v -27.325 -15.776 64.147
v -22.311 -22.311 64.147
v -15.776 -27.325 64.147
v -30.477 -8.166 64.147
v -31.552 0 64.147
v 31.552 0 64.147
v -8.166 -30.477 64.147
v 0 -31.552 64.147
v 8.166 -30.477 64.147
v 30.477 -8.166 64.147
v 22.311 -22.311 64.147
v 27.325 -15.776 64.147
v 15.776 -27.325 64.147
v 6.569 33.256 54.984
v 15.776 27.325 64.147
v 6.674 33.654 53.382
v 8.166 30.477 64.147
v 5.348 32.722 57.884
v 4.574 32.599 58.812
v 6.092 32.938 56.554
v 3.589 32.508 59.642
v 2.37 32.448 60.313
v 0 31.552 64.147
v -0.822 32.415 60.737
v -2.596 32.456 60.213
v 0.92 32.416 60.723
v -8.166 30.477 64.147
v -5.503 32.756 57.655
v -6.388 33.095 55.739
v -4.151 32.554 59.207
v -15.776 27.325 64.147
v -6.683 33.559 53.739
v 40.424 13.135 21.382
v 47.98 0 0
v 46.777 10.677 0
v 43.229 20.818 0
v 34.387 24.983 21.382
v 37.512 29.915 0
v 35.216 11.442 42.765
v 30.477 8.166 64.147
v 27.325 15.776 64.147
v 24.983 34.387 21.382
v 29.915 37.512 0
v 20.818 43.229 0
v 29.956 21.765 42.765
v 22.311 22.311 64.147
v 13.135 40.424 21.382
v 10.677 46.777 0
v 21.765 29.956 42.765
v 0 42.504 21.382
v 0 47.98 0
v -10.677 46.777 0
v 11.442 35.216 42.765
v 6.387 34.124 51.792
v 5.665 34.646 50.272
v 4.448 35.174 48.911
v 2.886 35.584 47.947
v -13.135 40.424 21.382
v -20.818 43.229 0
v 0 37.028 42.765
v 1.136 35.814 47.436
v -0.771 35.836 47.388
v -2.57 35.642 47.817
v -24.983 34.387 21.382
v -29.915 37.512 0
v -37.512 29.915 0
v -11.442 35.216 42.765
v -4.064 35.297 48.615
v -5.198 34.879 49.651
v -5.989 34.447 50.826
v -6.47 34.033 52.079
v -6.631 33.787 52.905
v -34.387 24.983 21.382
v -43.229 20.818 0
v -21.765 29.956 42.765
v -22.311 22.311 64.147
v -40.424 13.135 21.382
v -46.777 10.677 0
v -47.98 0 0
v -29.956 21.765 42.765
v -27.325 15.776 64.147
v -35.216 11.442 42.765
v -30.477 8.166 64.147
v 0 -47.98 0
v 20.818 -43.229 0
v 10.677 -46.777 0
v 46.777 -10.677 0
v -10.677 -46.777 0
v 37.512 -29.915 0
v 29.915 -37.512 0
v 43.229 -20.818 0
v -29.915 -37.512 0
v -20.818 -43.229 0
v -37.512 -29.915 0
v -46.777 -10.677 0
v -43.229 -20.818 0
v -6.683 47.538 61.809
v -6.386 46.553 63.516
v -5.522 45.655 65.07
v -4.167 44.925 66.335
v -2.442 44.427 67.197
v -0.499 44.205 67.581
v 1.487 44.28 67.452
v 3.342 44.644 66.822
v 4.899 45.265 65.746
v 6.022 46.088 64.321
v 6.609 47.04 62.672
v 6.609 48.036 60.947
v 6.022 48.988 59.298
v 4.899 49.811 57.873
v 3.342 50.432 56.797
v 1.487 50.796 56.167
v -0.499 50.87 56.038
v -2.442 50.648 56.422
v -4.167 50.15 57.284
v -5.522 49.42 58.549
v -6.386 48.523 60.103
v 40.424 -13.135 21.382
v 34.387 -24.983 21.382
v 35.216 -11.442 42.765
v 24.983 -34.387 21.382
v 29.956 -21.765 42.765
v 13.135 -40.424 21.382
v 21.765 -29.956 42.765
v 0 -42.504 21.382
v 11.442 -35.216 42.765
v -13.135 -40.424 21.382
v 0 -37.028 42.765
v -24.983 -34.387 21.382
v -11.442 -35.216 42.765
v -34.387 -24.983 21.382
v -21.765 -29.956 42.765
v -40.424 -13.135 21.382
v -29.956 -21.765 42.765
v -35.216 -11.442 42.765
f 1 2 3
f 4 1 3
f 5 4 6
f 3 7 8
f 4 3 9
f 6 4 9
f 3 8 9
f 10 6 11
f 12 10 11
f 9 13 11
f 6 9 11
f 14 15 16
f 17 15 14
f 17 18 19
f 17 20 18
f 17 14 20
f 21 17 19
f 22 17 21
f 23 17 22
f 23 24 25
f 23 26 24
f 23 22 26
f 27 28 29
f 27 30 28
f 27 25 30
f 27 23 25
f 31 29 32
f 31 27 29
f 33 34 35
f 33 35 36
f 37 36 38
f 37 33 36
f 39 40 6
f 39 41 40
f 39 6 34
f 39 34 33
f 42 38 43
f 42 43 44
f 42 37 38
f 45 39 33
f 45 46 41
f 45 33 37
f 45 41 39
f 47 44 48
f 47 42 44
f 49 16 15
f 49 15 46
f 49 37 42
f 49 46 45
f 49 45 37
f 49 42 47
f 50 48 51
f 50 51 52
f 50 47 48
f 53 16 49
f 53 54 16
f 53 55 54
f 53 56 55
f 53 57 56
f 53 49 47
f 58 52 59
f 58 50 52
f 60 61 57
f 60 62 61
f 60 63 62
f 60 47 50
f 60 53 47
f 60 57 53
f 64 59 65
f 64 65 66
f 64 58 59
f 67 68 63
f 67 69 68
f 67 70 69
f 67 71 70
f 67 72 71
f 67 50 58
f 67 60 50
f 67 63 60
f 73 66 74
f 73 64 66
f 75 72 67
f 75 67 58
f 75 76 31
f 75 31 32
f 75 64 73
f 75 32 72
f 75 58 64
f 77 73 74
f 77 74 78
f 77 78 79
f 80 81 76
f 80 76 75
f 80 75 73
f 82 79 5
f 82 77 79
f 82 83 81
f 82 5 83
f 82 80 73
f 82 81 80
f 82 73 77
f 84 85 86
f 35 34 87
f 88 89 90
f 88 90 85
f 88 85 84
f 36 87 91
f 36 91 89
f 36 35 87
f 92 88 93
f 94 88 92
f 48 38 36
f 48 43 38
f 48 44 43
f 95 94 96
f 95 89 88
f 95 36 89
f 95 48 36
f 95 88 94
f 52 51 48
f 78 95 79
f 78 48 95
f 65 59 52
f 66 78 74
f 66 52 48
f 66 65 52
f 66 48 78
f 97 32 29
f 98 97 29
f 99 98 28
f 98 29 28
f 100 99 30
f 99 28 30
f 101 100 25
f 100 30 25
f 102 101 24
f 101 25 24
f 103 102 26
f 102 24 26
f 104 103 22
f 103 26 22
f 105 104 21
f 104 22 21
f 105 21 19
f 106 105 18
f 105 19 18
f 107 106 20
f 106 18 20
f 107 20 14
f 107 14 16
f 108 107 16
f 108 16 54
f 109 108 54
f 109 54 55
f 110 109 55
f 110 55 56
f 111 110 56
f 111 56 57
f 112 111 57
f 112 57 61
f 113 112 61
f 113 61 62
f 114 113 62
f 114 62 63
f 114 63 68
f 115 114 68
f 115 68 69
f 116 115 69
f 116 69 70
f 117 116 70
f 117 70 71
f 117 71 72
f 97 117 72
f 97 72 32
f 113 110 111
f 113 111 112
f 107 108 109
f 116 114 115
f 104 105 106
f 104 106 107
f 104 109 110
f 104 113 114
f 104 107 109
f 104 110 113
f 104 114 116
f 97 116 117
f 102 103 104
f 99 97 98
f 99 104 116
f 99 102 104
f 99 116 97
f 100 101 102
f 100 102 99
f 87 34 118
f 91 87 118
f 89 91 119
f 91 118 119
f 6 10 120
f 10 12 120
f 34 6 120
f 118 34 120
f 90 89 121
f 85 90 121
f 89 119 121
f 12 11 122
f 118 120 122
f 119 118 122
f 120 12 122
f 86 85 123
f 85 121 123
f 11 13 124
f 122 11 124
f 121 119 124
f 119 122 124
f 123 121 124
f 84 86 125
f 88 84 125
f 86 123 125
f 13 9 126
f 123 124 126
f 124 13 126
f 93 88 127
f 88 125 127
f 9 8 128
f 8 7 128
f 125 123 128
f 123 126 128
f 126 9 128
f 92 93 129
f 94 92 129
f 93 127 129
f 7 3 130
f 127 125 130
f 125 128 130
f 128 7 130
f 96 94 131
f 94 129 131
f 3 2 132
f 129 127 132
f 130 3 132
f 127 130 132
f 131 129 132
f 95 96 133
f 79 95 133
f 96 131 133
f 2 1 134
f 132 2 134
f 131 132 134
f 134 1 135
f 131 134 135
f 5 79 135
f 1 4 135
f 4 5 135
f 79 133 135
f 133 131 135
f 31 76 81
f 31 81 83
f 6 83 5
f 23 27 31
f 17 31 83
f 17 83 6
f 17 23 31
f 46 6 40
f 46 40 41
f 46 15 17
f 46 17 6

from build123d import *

# Parameters (mm, degrees)
F1_ANGLE = 180
F4_R     = 6.68337
F5_DEPTH = 40


with BuildPart() as f1:
    # F0 (on Front) → F1 (revolve)
    with BuildSketch(Plane.XZ):
        Polygon((0, 64.147353), (0, 0), (47.980133, 0), (31.552151, 64.147353), align=None)
    revolve(axis=Axis((0, 0, 32.073677), (0, 0, -1)), revolution_arc=F1_ANGLE)

    # F3: F1 across plane


with BuildPart() as f1_1:
    add(f1.part)
    add(f1.part.mirror(Plane.XZ))

    # F4 (on face) → F5 (join)
    with BuildSketch(Plane(origin=(0, 27.776619, 16.036838), x_dir=(-1, 0, 0), z_dir=(0, 0.866025, 0.5))):
        with Locations((0, 29.759701)):
            Circle(F4_R)
    extrude(amount=F5_DEPTH)


solid = f1_1.part
